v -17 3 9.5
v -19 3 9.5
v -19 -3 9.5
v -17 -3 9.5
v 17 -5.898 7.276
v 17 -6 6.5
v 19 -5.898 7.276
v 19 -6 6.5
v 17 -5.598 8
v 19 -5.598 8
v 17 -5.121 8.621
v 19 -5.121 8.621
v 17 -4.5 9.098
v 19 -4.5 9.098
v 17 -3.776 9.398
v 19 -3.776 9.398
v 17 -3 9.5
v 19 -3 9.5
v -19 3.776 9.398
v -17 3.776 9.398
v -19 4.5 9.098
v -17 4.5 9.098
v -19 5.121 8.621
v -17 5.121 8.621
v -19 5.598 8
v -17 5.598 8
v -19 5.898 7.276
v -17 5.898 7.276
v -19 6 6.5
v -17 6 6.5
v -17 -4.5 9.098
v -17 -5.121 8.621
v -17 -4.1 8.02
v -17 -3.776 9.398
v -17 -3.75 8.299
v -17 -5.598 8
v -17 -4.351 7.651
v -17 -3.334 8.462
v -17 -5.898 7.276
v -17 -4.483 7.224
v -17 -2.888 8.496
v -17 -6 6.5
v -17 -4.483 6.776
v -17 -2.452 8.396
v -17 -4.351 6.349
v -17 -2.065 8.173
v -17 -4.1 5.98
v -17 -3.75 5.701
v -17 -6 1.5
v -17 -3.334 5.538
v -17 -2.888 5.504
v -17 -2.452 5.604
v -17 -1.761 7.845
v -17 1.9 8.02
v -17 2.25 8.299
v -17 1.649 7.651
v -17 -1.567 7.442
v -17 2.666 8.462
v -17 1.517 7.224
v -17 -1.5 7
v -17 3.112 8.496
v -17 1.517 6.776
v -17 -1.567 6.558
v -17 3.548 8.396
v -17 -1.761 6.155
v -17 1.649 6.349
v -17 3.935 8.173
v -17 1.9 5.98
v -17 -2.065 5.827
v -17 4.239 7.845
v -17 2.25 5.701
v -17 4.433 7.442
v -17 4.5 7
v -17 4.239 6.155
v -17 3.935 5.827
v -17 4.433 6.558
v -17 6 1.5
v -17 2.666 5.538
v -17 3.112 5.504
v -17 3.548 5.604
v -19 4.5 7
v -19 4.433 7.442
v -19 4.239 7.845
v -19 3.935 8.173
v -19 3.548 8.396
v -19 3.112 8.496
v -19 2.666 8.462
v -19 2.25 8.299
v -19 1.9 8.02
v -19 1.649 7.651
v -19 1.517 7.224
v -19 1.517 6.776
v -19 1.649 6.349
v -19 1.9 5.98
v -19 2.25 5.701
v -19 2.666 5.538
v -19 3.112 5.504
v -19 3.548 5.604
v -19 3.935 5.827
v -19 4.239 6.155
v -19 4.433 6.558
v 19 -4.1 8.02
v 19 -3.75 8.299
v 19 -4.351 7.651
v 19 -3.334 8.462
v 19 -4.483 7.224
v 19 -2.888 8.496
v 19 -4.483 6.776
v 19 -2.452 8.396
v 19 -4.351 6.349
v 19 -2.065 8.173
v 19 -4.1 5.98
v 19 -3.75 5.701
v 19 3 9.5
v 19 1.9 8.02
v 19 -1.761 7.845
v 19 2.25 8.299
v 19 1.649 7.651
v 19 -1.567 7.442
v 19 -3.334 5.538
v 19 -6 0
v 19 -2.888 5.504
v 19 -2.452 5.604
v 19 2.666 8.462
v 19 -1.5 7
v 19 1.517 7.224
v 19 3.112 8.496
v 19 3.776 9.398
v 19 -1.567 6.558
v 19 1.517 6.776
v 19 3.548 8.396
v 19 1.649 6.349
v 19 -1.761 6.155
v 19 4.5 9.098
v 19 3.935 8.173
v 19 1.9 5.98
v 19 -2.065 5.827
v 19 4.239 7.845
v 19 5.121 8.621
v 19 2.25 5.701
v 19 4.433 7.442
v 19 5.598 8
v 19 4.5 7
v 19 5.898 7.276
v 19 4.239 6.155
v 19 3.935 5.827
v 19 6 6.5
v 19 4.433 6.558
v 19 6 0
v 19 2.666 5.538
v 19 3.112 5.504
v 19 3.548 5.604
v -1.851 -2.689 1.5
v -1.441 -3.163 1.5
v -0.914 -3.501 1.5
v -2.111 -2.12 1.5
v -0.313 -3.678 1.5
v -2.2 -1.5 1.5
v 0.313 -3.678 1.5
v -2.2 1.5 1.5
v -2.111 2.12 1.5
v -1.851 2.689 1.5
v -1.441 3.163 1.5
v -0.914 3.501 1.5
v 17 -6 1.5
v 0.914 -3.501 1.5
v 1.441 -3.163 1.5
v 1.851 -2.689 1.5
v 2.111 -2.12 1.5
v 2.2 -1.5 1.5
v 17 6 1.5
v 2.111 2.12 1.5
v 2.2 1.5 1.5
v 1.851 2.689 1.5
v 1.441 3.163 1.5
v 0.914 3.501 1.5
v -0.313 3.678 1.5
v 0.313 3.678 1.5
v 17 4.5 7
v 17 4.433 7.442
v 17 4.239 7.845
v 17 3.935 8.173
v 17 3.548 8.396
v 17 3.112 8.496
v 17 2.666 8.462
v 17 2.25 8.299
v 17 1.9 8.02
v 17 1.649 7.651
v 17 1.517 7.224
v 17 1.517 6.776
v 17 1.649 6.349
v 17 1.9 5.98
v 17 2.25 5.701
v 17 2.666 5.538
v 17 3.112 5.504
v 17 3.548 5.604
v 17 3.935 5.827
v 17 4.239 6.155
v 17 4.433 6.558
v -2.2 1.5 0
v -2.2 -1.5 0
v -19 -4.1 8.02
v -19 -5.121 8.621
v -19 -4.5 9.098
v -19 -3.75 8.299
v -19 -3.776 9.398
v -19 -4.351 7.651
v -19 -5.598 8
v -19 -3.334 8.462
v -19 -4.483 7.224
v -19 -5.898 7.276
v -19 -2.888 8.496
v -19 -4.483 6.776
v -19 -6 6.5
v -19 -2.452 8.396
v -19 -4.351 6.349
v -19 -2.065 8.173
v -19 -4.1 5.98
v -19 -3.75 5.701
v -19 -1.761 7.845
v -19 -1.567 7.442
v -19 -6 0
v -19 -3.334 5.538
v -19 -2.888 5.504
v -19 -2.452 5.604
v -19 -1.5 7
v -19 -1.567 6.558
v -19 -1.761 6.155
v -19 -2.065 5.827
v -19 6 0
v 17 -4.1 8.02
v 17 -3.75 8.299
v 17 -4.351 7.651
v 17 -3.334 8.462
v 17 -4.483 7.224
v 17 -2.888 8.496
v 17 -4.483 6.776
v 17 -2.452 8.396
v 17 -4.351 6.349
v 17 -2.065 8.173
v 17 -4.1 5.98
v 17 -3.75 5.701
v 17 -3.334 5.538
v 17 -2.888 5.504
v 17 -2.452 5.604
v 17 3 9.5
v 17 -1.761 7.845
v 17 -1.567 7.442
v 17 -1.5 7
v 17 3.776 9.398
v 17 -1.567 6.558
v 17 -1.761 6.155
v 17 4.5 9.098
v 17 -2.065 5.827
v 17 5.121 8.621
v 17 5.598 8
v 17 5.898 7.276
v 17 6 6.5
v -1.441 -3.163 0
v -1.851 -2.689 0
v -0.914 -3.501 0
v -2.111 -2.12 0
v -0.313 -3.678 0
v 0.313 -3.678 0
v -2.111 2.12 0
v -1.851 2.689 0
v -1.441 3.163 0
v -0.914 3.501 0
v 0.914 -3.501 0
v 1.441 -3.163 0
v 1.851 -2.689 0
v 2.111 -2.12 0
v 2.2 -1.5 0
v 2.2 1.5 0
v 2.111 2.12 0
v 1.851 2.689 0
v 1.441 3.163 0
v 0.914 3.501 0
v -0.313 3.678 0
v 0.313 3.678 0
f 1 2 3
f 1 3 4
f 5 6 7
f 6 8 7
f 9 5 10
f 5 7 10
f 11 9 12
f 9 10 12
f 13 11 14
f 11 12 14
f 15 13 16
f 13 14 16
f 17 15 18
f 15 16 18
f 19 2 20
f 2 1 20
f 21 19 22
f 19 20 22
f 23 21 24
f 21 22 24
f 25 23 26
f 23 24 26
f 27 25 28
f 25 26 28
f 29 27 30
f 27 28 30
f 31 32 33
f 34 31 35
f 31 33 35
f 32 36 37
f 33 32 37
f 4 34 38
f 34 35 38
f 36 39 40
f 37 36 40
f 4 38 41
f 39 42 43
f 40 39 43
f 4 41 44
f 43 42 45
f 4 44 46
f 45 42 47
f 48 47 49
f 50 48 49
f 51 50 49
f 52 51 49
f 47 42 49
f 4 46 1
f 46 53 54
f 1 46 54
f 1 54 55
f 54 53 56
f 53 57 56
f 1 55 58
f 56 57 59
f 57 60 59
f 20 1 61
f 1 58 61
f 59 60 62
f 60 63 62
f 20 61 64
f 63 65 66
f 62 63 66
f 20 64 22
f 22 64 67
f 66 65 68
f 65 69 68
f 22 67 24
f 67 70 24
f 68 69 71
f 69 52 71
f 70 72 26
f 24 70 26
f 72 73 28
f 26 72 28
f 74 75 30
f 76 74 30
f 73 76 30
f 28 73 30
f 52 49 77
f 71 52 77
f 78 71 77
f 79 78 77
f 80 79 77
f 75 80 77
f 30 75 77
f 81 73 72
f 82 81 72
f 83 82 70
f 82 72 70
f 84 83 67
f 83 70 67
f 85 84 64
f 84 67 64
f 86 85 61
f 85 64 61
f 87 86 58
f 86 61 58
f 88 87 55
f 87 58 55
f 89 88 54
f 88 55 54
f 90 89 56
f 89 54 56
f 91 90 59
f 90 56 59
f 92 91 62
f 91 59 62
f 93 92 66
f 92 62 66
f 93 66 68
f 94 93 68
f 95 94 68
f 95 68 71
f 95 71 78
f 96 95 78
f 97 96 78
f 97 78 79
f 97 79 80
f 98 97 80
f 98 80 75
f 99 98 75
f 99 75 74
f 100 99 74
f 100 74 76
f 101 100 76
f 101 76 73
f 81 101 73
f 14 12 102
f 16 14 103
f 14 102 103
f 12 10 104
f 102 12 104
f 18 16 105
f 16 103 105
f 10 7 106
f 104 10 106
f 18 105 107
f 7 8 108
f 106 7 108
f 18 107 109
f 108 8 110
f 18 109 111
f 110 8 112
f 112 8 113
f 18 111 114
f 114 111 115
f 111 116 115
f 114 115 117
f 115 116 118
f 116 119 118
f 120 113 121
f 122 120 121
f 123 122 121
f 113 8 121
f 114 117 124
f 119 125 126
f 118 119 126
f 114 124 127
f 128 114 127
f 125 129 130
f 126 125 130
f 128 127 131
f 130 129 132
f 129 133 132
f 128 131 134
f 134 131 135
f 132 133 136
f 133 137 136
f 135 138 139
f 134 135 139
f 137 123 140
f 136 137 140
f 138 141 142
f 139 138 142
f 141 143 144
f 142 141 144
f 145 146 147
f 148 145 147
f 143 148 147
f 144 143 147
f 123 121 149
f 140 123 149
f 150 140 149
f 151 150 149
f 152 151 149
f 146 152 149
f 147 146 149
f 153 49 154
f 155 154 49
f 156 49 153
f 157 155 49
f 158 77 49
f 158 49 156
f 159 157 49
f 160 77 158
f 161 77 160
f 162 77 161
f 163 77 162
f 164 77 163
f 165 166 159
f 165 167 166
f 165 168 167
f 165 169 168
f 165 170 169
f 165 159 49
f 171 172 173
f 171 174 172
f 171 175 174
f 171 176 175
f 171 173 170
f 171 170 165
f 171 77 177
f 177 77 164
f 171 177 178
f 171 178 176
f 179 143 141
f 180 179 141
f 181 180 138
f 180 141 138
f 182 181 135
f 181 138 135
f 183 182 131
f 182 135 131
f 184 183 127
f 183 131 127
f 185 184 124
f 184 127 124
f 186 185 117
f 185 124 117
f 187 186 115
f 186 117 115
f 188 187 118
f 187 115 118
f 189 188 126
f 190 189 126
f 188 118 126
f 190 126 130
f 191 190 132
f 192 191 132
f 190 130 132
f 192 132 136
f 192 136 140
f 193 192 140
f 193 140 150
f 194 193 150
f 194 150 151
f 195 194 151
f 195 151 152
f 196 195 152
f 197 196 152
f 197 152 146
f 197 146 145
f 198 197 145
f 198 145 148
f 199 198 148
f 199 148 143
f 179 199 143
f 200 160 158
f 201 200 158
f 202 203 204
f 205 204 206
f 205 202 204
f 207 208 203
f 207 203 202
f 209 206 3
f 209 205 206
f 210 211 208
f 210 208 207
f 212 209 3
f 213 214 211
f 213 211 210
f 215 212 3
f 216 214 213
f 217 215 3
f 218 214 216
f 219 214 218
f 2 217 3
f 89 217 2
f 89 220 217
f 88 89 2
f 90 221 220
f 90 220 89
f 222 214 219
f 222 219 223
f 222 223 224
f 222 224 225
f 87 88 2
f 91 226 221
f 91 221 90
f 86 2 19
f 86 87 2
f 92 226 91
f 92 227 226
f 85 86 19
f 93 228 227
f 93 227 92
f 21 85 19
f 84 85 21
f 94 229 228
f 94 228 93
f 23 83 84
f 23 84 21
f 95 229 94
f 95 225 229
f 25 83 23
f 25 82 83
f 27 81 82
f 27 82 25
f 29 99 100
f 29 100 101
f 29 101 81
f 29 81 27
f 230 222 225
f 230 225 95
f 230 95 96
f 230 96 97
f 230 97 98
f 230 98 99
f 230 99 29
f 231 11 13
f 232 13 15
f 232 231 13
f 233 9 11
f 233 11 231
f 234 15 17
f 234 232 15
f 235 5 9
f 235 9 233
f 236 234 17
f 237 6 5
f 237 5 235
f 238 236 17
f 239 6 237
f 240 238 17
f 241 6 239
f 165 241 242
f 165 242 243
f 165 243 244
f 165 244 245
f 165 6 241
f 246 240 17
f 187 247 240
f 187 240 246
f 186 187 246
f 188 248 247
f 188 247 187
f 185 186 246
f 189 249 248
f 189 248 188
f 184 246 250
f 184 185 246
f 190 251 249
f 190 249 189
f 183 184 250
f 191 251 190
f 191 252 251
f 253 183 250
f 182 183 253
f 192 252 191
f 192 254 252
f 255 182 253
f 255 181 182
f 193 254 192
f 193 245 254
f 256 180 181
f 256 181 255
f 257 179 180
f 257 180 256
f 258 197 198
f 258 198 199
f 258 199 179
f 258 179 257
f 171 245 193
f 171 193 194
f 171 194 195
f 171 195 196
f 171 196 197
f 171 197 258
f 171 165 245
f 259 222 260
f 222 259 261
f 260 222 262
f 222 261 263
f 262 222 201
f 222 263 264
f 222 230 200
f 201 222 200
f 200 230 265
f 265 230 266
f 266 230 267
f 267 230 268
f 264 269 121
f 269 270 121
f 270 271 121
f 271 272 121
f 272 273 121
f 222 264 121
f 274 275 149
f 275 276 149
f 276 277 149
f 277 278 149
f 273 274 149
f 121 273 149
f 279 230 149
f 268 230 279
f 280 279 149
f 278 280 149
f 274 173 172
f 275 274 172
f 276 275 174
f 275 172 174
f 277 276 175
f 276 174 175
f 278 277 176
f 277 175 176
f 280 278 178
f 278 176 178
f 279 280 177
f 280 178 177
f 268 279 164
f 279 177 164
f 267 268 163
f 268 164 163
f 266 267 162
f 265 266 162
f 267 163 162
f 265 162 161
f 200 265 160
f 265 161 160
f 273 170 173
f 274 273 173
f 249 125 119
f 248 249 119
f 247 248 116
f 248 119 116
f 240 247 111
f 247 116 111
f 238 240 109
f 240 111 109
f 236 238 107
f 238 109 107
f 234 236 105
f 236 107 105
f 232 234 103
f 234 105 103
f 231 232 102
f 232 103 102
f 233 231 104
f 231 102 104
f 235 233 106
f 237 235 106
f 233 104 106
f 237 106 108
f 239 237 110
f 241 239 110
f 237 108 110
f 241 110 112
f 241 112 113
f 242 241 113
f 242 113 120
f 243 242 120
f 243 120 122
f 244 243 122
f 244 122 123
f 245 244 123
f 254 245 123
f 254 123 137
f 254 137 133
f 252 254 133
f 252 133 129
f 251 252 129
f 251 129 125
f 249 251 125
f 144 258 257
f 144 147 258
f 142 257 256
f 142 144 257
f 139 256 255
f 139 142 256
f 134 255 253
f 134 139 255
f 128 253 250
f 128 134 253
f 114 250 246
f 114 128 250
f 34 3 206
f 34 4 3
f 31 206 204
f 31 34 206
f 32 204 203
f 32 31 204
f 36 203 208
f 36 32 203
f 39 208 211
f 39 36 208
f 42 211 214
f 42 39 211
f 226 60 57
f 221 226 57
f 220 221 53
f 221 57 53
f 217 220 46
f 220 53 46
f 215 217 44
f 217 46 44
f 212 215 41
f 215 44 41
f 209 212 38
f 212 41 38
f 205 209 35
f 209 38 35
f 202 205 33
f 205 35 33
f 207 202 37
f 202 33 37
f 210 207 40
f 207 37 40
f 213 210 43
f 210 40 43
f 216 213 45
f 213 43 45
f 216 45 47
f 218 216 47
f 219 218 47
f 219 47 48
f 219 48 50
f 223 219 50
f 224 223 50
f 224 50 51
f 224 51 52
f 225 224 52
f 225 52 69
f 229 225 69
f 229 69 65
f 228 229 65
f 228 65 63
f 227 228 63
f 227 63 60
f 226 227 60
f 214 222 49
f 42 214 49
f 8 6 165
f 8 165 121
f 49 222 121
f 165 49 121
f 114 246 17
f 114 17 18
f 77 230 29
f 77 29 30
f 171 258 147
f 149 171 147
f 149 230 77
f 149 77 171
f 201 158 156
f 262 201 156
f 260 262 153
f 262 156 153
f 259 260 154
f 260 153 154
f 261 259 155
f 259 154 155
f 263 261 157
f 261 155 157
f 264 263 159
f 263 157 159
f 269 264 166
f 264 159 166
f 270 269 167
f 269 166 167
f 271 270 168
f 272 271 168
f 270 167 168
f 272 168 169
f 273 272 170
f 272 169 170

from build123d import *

# Parameters (mm, degrees)
SKETCH1_W      = 38
SKETCH1_H      = 12
EXTRUDE1_DEPTH = 1.5
SKETCH2_W      = 2
SKETCH2_H      = 12
EXTRUDE2_DEPTH = 8
EXTRUDE3_REACH = 41.626
SKETCH3_R      = 1.5
FILLET1_R      = 3
EXTRUDE4_DEPTH = 1.5


with BuildPart() as part:
    # Sketch1 → Extrude1 (new body)
    with BuildSketch(Plane.XY):
        Rectangle(SKETCH1_W, SKETCH1_H)
    extrude(amount=EXTRUDE1_DEPTH)

    # Sketch2 → Extrude2 (add)
    with BuildSketch(Plane.XY.offset(1.5)):
        with Locations((-18, 0)):
            Rectangle(SKETCH2_W, SKETCH2_H)
        with Locations((18, 0)):
            Rectangle(SKETCH2_W, SKETCH2_H)
    extrude(amount=EXTRUDE2_DEPTH)

    # Extrude3: up to this face of the body (flat: up to its plane)
    extrude3_end = Plane(part.part.faces().sort_by_distance((-19, 0, 4.75))[0])
    # Sketch3 → Extrude3 (cut, up to the picked face)
    with BuildSketch(Plane(origin=(19, 0, 0), x_dir=(0, 0, -1), z_dir=(1, 0, 0)), mode=Mode.PRIVATE) as extrude3_sk1:
        with Locations(Location((-7, 3, 0), (0, 0, 90))):
            Circle(SKETCH3_R)
    extrude3_tool1 = split(extrude(extrude3_sk1.sketch, amount=-EXTRUDE3_REACH, mode=Mode.PRIVATE), bisect_by=extrude3_end, keep=Keep.BOTH, mode=Mode.PRIVATE)
    # Sketch3 → Extrude3 (cut, up to the picked face)
    with BuildSketch(Plane(origin=(19, 0, 0), x_dir=(0, 0, -1), z_dir=(1, 0, 0)), mode=Mode.PRIVATE) as extrude3_sk2:
        with Locations(Location((-7, -3, 0), (0, 0, 90))):
            Circle(SKETCH3_R)
    extrude3_tool2 = split(extrude(extrude3_sk2.sketch, amount=-EXTRUDE3_REACH, mode=Mode.PRIVATE), bisect_by=extrude3_end, keep=Keep.BOTH, mode=Mode.PRIVATE)
    add(extrude3_tool1.solids().sort_by(Axis((19, 3, 7), (-1, 0, 0)))[0], mode=Mode.SUBTRACT)
    add(extrude3_tool2.solids().sort_by(Axis((19, -3, 7), (-1, 0, 0)))[0], mode=Mode.SUBTRACT)

    # Fillet1
    fillet1_edges = [part.edges().sort_by_distance(p)[0] for p in [
        (18, 6, 9.5),
        (18, -6, 9.5),
        (-18, -6, 9.5),
        (-18, 6, 9.5),
    ]]
    fillet(fillet1_edges, radius=FILLET1_R)

    # Sketch4 → Extrude4 (cut)
    with BuildSketch(Plane.XY.offset(1.5)):
        with BuildLine():
            Line((-2.2, 1.5), (-2.2, -1.5))
            ThreePointArc((-2.2, -1.5), (0, -3.7), (2.2, -1.5))
            Line((2.2, -1.5), (2.2, 1.5))
            ThreePointArc((2.2, 1.5), (0, 3.7), (-2.2, 1.5))
        make_face()
    extrude(amount=-EXTRUDE4_DEPTH, mode=Mode.SUBTRACT)


solid = part.part
